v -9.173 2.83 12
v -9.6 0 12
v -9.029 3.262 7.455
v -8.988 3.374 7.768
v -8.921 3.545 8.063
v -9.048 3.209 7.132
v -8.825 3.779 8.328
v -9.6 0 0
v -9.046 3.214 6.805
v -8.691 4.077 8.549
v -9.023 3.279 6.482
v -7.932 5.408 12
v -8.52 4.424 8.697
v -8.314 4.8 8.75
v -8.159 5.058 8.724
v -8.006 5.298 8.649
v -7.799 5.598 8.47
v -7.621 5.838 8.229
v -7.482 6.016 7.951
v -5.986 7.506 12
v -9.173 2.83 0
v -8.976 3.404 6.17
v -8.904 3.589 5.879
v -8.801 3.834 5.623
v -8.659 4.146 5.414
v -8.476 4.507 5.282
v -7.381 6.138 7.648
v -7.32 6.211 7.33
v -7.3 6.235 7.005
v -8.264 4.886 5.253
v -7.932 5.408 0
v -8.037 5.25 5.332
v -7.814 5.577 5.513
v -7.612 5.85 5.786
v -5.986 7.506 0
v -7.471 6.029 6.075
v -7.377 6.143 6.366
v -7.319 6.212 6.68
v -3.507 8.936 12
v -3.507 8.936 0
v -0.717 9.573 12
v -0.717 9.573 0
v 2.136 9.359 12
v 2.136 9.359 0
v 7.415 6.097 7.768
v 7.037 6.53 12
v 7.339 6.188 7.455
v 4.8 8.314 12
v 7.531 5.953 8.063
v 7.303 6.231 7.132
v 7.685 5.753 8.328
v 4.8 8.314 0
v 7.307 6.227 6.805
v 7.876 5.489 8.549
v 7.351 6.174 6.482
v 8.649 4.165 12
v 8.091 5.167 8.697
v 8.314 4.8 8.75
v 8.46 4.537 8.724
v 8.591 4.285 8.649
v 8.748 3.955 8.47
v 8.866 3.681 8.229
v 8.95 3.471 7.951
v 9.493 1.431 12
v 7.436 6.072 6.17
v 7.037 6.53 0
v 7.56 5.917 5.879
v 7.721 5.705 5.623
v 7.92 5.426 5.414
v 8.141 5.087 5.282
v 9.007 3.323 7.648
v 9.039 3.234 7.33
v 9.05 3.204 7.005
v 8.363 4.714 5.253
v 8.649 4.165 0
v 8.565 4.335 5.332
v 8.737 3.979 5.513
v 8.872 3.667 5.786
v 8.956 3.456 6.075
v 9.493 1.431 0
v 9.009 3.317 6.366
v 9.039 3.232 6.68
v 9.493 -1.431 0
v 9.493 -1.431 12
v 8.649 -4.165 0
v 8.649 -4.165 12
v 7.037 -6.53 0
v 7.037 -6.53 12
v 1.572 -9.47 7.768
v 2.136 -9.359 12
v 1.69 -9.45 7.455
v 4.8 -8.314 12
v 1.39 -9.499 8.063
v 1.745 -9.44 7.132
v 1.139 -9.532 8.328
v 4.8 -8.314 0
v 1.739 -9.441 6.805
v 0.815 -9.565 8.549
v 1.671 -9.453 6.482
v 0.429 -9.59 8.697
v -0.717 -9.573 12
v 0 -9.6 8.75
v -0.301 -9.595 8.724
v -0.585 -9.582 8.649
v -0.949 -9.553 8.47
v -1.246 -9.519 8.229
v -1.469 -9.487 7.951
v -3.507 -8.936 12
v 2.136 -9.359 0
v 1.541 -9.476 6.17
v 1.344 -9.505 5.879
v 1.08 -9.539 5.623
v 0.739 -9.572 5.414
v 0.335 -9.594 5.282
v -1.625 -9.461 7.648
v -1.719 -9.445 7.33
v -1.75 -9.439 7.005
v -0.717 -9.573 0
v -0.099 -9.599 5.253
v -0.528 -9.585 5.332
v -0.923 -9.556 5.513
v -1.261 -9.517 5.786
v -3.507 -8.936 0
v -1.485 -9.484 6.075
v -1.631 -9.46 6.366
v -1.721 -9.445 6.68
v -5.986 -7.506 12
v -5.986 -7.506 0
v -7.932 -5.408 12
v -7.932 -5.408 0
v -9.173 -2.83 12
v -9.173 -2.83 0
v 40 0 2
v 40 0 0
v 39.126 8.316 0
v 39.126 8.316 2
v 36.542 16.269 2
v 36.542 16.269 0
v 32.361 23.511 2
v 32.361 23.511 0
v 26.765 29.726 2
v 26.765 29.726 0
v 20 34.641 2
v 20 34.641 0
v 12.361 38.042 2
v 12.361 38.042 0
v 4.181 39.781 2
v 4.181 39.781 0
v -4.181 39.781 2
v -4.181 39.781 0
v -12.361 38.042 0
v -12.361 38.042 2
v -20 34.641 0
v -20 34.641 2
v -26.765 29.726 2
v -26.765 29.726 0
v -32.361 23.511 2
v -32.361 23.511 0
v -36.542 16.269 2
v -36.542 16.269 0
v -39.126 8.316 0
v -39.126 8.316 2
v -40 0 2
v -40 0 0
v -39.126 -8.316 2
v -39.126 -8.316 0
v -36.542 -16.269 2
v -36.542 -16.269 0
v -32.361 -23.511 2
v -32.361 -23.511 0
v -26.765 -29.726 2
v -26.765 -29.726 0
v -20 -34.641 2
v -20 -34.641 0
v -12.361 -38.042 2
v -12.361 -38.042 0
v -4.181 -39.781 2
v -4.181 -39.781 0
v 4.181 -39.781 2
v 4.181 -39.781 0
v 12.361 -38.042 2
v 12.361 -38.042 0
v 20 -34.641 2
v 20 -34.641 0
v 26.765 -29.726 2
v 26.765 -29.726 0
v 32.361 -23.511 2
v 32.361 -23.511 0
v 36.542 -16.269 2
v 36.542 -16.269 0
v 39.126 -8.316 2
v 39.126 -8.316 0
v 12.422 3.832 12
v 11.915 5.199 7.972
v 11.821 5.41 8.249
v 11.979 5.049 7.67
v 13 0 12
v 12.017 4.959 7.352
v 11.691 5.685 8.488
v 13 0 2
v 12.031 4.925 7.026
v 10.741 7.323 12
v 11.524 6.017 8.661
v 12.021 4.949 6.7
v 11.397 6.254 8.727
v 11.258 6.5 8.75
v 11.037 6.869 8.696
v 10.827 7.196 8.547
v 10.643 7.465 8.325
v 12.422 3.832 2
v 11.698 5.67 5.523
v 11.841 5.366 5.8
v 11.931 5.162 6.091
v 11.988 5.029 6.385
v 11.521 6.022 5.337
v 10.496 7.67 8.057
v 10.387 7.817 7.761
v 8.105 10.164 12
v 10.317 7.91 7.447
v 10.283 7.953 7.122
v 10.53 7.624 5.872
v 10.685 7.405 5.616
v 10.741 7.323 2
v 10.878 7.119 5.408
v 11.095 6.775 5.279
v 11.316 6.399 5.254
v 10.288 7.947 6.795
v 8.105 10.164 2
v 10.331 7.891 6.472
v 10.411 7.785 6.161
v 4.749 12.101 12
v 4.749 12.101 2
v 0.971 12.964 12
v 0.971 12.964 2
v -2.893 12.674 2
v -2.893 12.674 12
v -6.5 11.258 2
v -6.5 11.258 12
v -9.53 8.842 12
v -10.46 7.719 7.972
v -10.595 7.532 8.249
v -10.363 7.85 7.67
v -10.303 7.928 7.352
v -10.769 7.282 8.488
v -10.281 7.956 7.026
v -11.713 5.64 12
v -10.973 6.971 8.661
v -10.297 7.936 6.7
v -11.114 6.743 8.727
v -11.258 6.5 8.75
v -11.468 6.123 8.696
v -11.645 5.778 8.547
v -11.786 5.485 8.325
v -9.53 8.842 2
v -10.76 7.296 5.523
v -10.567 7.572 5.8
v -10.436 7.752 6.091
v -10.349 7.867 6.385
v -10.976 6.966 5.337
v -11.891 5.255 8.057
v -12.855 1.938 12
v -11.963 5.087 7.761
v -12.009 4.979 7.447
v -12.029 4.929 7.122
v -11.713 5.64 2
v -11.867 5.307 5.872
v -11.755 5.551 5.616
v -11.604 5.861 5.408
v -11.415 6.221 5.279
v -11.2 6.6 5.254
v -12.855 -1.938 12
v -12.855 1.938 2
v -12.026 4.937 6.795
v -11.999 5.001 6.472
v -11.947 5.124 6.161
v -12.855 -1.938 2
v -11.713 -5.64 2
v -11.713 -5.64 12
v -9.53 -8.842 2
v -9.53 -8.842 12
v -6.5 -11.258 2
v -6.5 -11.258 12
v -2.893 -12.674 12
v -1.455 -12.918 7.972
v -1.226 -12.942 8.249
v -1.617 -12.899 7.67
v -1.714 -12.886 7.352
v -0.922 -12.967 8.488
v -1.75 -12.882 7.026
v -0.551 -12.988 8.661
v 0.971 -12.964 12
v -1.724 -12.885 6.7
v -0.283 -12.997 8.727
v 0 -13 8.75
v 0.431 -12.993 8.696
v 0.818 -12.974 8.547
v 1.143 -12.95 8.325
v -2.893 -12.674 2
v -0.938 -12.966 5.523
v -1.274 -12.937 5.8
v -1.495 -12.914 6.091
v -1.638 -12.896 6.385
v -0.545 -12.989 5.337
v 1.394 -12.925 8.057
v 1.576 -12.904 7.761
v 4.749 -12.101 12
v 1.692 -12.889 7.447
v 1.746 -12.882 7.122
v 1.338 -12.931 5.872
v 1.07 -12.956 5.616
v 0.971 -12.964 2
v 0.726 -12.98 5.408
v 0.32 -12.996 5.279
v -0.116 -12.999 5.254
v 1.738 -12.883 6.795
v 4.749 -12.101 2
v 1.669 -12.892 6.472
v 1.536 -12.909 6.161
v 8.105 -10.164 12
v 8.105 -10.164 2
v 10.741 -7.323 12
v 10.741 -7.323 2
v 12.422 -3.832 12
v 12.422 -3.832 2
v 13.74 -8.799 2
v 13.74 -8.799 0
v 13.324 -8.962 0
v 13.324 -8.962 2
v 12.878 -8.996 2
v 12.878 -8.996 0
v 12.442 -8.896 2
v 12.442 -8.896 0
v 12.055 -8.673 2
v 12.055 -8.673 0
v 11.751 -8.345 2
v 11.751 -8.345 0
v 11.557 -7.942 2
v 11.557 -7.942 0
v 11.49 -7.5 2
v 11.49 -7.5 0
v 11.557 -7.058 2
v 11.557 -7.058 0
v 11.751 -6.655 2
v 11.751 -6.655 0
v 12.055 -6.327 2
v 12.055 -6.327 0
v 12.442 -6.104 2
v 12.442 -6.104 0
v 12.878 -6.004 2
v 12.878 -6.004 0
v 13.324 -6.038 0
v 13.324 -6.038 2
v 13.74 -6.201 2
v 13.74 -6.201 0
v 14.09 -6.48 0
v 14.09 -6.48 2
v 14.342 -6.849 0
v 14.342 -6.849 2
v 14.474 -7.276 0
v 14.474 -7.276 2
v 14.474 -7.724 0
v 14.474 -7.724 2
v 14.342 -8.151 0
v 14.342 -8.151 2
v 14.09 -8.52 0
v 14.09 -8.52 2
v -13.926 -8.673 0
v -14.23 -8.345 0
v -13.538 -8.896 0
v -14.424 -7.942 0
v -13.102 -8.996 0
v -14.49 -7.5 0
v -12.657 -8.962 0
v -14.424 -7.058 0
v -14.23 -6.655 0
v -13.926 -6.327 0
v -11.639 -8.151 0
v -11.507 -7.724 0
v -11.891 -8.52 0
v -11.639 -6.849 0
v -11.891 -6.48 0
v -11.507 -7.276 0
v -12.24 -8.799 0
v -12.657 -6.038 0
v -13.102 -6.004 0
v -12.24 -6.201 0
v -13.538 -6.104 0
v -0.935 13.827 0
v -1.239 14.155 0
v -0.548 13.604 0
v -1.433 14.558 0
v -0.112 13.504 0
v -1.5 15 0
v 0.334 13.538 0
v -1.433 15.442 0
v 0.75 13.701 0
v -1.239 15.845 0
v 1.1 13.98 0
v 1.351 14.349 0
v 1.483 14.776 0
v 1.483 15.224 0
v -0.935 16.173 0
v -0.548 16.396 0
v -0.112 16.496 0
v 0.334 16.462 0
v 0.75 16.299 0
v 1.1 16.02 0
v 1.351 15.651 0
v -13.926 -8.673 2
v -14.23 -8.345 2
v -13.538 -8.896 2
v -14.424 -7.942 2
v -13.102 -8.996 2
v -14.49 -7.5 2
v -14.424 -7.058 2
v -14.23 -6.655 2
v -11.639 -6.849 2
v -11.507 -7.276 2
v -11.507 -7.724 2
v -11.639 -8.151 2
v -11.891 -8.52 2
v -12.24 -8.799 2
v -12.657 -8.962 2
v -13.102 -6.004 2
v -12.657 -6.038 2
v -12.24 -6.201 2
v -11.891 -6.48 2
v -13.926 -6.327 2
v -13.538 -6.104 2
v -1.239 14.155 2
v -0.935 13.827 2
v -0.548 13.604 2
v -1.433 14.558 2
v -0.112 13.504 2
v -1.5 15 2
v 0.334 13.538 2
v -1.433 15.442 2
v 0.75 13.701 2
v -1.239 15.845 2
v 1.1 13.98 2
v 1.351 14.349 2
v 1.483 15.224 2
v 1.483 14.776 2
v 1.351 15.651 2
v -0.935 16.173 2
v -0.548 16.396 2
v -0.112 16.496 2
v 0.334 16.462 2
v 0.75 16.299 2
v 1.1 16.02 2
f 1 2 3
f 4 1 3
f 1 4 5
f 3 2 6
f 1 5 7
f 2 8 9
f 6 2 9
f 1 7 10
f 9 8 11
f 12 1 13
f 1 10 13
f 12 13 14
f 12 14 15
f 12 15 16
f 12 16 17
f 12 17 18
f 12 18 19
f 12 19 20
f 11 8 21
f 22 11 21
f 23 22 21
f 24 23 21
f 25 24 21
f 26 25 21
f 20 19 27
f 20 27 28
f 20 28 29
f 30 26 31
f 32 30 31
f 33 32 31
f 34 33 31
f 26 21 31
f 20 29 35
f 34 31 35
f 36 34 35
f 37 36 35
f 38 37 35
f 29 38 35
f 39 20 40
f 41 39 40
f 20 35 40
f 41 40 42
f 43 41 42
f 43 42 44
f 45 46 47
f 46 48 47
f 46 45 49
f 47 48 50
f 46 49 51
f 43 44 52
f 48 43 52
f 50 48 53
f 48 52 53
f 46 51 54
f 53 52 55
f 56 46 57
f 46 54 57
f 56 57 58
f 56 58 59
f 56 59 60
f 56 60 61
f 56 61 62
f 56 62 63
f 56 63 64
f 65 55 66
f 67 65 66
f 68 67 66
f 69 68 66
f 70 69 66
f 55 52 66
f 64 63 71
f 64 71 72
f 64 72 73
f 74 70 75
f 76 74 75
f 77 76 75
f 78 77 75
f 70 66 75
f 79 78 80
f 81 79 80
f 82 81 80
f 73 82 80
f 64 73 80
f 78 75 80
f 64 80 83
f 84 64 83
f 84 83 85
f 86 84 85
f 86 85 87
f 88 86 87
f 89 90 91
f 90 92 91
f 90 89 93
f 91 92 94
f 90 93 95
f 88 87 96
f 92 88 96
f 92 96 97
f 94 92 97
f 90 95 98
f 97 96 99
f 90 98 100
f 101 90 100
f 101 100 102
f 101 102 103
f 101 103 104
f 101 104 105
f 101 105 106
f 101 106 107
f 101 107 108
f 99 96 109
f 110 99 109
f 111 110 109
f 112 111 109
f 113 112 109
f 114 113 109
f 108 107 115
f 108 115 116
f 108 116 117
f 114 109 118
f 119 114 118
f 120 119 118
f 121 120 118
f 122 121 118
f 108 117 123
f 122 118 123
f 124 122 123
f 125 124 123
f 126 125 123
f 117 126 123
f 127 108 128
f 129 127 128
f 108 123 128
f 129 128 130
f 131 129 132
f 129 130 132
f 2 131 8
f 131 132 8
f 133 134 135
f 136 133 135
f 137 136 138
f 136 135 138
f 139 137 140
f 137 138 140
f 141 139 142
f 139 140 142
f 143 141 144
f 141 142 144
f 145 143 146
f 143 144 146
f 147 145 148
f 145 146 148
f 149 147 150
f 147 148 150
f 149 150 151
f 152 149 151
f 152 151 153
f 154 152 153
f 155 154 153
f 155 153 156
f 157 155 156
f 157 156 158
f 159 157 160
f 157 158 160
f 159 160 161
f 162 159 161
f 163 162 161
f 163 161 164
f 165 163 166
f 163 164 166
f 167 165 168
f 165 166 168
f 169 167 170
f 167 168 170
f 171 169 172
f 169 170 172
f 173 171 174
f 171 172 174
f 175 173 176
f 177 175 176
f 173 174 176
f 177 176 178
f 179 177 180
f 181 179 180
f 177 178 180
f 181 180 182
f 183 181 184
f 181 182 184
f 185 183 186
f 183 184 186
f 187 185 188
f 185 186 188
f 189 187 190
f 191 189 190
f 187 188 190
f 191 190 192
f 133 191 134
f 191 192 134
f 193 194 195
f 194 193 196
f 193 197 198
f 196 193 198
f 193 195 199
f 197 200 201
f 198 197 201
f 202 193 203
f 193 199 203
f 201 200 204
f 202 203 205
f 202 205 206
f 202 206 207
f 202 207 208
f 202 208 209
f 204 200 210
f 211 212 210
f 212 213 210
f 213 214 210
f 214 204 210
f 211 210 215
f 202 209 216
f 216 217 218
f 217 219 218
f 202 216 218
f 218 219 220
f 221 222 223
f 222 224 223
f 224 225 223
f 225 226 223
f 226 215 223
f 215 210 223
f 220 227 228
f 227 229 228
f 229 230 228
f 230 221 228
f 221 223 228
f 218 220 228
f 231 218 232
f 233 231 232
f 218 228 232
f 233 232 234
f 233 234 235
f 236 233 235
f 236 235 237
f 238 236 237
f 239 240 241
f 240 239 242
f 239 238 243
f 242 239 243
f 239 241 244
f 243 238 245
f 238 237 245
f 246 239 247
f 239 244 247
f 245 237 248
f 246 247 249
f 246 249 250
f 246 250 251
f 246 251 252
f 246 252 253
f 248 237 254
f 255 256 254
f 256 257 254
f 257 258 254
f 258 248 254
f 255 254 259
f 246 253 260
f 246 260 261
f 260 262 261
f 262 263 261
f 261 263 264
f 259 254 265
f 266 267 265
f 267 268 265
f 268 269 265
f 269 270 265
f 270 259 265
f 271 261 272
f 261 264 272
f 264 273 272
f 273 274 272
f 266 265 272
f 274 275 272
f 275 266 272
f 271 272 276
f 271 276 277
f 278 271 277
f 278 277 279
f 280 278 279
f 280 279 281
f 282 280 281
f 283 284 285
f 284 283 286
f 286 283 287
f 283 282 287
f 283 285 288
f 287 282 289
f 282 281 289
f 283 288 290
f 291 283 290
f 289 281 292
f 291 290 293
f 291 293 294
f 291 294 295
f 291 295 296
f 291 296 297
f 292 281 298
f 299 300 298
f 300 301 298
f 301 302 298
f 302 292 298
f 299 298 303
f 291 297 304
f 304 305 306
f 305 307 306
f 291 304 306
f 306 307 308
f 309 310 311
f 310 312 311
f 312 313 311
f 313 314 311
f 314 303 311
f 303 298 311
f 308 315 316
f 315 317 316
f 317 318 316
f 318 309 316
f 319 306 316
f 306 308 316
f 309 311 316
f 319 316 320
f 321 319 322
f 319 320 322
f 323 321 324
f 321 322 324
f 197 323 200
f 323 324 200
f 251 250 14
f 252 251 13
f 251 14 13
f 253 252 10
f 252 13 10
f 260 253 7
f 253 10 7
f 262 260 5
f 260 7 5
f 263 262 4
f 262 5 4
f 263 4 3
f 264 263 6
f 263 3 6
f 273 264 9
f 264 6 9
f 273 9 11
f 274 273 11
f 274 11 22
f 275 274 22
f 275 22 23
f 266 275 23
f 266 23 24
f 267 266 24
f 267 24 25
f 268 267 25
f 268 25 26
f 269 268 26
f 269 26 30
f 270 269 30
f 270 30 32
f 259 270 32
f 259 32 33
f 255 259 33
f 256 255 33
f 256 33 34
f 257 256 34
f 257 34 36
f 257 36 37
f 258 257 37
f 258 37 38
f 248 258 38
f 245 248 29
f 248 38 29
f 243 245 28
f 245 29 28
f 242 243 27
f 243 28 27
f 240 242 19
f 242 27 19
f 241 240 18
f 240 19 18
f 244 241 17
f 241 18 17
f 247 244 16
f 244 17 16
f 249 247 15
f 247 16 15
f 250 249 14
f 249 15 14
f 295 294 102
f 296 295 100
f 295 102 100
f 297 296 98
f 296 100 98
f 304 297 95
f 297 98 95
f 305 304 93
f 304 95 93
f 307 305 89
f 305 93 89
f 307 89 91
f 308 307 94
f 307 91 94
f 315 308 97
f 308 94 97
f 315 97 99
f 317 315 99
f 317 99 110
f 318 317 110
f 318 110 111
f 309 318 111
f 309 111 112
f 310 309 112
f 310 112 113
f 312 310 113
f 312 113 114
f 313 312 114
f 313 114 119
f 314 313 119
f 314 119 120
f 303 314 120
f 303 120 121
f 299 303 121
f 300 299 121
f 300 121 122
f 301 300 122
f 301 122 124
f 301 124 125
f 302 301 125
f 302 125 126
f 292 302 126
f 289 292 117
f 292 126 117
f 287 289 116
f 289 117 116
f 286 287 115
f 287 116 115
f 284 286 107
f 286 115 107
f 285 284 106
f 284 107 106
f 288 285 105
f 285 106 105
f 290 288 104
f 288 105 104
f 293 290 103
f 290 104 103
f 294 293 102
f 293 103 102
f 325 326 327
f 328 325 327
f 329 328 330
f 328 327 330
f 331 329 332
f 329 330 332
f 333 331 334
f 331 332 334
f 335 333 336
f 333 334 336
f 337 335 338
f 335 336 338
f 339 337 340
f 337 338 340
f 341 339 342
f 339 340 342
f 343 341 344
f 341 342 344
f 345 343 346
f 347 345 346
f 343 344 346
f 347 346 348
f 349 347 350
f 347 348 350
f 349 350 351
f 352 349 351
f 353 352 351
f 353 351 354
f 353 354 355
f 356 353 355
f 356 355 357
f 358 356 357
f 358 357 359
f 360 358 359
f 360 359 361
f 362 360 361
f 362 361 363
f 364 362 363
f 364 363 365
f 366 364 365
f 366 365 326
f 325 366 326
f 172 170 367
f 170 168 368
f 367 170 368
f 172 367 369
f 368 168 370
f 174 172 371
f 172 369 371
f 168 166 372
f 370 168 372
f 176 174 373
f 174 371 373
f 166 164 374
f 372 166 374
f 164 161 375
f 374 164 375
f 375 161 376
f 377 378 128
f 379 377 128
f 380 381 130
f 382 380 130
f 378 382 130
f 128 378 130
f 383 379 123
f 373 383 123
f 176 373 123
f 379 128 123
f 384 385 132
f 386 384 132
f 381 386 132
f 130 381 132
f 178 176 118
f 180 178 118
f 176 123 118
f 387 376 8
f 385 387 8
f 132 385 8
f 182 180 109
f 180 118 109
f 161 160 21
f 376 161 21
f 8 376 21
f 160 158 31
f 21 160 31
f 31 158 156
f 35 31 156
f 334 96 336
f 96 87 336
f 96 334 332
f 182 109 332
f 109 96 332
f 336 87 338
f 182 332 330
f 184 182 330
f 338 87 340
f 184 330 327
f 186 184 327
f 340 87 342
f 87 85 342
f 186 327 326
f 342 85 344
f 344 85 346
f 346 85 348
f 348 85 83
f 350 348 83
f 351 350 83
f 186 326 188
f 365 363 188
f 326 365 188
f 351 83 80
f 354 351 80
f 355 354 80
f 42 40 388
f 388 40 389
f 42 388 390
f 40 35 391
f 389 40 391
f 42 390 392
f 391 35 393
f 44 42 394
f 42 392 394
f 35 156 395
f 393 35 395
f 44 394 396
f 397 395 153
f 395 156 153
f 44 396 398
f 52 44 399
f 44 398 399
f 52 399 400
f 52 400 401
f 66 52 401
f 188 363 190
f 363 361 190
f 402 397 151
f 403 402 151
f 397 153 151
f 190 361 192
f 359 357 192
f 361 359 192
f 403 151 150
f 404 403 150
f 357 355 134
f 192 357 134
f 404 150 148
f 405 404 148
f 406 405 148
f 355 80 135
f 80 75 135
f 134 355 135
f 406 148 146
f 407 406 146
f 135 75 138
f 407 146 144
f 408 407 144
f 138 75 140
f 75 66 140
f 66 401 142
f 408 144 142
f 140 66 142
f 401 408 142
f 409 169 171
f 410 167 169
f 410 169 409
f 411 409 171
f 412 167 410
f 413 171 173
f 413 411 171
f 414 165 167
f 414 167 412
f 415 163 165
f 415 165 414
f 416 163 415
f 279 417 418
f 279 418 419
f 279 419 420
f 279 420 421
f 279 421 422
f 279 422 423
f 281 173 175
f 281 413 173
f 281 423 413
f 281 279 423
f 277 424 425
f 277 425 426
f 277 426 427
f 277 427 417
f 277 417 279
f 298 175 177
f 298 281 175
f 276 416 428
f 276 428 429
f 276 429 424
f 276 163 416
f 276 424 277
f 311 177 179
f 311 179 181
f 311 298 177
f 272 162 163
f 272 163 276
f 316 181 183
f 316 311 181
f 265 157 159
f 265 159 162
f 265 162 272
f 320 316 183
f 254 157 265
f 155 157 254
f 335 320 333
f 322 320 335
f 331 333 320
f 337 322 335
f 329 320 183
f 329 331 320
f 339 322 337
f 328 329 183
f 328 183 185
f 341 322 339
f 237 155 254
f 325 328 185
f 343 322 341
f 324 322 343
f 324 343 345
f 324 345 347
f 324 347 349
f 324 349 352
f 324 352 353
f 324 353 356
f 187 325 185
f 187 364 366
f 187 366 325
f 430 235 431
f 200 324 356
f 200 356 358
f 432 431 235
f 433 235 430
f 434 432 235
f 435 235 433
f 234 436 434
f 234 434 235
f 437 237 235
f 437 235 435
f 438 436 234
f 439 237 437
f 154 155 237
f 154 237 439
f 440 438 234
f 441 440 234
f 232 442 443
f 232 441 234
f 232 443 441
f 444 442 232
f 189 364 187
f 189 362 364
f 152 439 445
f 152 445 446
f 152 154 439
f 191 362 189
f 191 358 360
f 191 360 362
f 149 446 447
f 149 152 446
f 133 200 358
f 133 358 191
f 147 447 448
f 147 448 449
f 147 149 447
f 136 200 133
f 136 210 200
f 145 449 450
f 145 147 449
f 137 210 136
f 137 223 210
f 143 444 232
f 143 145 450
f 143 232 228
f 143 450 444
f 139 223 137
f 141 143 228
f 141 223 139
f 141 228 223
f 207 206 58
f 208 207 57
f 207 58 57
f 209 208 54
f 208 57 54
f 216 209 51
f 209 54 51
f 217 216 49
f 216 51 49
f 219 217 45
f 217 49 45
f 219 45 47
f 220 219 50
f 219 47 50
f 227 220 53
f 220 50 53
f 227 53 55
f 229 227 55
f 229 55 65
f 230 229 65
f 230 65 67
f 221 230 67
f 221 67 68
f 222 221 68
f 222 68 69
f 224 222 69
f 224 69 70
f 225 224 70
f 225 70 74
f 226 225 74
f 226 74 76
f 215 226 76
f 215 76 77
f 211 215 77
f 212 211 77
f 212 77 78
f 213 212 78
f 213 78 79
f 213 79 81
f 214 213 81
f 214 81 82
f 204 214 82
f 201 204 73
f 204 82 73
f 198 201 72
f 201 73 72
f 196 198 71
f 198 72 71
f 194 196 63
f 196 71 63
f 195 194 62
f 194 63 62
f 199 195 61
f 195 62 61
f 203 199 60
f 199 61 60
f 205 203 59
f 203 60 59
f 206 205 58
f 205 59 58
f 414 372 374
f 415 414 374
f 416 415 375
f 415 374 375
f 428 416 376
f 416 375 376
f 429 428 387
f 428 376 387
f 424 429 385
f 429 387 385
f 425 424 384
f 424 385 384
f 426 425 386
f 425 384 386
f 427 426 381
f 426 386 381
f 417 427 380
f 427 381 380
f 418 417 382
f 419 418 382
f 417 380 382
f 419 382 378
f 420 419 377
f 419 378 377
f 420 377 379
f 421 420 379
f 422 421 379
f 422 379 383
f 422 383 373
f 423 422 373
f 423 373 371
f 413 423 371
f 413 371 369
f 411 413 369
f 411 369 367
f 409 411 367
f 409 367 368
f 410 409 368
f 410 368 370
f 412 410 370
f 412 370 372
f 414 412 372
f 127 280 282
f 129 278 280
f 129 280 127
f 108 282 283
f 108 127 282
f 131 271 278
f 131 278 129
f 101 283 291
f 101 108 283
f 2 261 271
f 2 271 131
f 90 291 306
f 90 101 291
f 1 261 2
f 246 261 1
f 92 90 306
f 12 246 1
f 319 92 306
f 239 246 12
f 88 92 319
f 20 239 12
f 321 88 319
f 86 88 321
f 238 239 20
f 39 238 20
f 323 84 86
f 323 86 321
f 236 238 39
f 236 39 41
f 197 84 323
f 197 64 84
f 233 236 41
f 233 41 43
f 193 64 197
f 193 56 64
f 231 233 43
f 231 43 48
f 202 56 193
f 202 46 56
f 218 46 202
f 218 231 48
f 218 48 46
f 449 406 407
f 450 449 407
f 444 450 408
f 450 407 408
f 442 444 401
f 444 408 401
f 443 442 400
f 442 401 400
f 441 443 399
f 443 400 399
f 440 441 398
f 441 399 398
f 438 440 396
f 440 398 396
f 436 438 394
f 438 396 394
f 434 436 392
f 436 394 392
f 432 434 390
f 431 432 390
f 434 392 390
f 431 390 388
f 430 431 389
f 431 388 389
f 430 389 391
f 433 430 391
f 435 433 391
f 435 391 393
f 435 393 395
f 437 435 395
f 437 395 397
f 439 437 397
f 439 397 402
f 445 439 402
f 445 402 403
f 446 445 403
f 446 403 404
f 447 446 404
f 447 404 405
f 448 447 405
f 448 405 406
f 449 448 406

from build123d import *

# Parameters (mm, degrees)
SKETCH1_R           = 40
BOSS_EXTRUDE1_DEPTH = 2
SKETCH2_R           = 13
BOSS_EXTRUDE2_DEPTH = 10
SKETCH3_R           = 9.6
CUT_EXTRUDE1_DEPTH  = 58.827329179
SKETCH4_R           = 1.75
CUT_EXTRUDE2_DEPTH  = 58.827329179
CIRPATTERN1_COUNT   = 3
SKETCH5_R           = 1.5
CUT_EXTRUDE3_DEPTH  = 10
CIRPATTERN2_COUNT   = 3


with BuildPart() as part:
    # Sketch1 → Boss-Extrude1 (new body)
    with BuildSketch(Plane.XY):
        Circle(SKETCH1_R)
    extrude(amount=BOSS_EXTRUDE1_DEPTH)

    # Sketch2 → Boss-Extrude2 (add)
    with BuildSketch(Plane.XY.offset(2)):
        Circle(SKETCH2_R)
    extrude(amount=BOSS_EXTRUDE2_DEPTH)

    # Sketch3 → Cut-Extrude1 (cut, through all)
    with BuildSketch(Plane(origin=(0, 0, 0), x_dir=(-1, 0, 0), z_dir=(0, 0, -1))):
        Circle(SKETCH3_R)
    extrude(amount=-CUT_EXTRUDE1_DEPTH, mode=Mode.SUBTRACT)

    # Sketch4 → Cut-Extrude2 (cut, through all)
    with BuildSketch(Plane(origin=(0, 0, 0), x_dir=(1, 0, 0), z_dir=(0, 1, 0))):
        with Locations(Location((0, -7, 0), (0, 0, 270))):
            Circle(SKETCH4_R)
    cut_extrude2 = extrude(amount=-CUT_EXTRUDE2_DEPTH, mode=Mode.SUBTRACT)

    # CirPattern1: Cut-Extrude2 ×3 about axis
    cirpattern1_axis = Axis((0, 0, 12), (0, 0, -1))
    for i in range(1, CIRPATTERN1_COUNT):
        add(cut_extrude2.rotate(cirpattern1_axis, i * 360 / CIRPATTERN1_COUNT), mode=Mode.SUBTRACT)

    # Sketch5 → Cut-Extrude3 (cut)
    with BuildSketch(Plane(origin=(0, 0, 0), x_dir=(-1, 0, 0), z_dir=(0, 0, -1))):
        with Locations((12.990381057, -7.5)):
            Circle(SKETCH5_R)
    cut_extrude3 = extrude(amount=-CUT_EXTRUDE3_DEPTH, mode=Mode.SUBTRACT)

    # CirPattern2: Cut-Extrude3 ×3 about axis
    cirpattern2_axis = Axis((0, 0, 0), (0, 0, 1))
    for i in range(1, CIRPATTERN2_COUNT):
        add(cut_extrude3.rotate(cirpattern2_axis, i * 360 / CIRPATTERN2_COUNT), mode=Mode.SUBTRACT)


solid = part.part
